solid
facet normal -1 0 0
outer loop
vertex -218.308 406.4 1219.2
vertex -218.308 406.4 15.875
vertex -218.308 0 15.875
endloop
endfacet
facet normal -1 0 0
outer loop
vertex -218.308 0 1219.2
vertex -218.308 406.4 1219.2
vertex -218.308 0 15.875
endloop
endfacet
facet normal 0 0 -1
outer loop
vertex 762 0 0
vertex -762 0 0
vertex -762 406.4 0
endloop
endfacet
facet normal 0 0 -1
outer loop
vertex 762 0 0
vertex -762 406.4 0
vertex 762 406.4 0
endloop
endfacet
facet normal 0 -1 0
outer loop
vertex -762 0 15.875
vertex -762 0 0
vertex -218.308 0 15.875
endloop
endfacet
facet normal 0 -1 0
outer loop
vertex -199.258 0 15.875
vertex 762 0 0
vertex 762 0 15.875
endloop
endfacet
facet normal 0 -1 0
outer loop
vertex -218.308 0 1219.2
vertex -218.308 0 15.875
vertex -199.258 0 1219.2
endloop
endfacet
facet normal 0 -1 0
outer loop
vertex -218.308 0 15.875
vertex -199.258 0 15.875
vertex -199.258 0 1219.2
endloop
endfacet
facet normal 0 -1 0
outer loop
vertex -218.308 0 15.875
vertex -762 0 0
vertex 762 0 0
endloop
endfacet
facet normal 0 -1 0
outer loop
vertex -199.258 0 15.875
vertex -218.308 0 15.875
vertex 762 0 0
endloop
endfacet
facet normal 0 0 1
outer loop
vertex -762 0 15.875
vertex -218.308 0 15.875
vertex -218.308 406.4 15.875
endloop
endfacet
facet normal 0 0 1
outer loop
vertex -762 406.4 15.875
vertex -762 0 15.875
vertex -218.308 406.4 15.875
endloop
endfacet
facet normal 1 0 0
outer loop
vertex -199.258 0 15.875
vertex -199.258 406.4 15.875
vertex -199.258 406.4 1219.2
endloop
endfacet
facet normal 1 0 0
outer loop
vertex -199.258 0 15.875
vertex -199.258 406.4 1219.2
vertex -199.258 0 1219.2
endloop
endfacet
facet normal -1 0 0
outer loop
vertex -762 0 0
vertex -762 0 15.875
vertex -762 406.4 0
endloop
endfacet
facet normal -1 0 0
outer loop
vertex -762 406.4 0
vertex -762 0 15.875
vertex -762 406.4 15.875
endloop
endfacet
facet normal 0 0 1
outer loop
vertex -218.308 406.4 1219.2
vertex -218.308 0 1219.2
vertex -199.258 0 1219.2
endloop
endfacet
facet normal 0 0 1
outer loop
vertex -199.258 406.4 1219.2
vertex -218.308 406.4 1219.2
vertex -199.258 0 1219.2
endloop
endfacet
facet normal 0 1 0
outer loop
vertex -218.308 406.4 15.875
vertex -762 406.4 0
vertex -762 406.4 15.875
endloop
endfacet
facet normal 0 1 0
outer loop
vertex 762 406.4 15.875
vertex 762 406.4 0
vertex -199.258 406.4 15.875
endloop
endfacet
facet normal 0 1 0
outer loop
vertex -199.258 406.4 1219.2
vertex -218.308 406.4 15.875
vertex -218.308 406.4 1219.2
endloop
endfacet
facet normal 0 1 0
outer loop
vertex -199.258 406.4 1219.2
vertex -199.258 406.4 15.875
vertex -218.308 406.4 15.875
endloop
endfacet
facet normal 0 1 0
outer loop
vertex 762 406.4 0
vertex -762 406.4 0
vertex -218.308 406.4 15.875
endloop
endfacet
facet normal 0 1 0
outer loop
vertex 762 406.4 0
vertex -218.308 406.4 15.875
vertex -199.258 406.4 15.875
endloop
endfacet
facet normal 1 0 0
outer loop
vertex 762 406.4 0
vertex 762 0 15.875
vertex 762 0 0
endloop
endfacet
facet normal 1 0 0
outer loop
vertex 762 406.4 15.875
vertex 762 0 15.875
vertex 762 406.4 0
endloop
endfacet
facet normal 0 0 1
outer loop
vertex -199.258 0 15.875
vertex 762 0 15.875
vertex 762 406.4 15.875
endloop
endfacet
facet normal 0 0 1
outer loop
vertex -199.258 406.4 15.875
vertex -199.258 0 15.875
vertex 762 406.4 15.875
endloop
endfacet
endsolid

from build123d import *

# Parameters (mm, degrees)
F0_W     = 406.4
F0_H     = 15.875
F1_DEPTH = 762
F4_W     = 19.05
F4_H     = 406.4
F5_DEPTH = 1219.2


with BuildPart() as f1:
    # F0 (on Right) → F1 (new body)
    with BuildSketch(Plane.YZ):
        with Locations((203.2, 7.9375)):
            Rectangle(F0_W, F0_H)
    extrude(amount=F1_DEPTH)

    # F2: F1 across plane


with BuildPart() as f1_1:
    add(f1.part)
    add(f1.part.mirror(Plane.YZ))

    # F4 (on face) → F5 (join)
    with BuildSketch(Plane(origin=(0, 0, 0), x_dir=(1, 0, 0), z_dir=(0, 0, -1))):
        with Locations((-208.782977, -203.2)):
            Rectangle(F4_W, F4_H)
    extrude(amount=-F5_DEPTH)


solid = f1_1.part
